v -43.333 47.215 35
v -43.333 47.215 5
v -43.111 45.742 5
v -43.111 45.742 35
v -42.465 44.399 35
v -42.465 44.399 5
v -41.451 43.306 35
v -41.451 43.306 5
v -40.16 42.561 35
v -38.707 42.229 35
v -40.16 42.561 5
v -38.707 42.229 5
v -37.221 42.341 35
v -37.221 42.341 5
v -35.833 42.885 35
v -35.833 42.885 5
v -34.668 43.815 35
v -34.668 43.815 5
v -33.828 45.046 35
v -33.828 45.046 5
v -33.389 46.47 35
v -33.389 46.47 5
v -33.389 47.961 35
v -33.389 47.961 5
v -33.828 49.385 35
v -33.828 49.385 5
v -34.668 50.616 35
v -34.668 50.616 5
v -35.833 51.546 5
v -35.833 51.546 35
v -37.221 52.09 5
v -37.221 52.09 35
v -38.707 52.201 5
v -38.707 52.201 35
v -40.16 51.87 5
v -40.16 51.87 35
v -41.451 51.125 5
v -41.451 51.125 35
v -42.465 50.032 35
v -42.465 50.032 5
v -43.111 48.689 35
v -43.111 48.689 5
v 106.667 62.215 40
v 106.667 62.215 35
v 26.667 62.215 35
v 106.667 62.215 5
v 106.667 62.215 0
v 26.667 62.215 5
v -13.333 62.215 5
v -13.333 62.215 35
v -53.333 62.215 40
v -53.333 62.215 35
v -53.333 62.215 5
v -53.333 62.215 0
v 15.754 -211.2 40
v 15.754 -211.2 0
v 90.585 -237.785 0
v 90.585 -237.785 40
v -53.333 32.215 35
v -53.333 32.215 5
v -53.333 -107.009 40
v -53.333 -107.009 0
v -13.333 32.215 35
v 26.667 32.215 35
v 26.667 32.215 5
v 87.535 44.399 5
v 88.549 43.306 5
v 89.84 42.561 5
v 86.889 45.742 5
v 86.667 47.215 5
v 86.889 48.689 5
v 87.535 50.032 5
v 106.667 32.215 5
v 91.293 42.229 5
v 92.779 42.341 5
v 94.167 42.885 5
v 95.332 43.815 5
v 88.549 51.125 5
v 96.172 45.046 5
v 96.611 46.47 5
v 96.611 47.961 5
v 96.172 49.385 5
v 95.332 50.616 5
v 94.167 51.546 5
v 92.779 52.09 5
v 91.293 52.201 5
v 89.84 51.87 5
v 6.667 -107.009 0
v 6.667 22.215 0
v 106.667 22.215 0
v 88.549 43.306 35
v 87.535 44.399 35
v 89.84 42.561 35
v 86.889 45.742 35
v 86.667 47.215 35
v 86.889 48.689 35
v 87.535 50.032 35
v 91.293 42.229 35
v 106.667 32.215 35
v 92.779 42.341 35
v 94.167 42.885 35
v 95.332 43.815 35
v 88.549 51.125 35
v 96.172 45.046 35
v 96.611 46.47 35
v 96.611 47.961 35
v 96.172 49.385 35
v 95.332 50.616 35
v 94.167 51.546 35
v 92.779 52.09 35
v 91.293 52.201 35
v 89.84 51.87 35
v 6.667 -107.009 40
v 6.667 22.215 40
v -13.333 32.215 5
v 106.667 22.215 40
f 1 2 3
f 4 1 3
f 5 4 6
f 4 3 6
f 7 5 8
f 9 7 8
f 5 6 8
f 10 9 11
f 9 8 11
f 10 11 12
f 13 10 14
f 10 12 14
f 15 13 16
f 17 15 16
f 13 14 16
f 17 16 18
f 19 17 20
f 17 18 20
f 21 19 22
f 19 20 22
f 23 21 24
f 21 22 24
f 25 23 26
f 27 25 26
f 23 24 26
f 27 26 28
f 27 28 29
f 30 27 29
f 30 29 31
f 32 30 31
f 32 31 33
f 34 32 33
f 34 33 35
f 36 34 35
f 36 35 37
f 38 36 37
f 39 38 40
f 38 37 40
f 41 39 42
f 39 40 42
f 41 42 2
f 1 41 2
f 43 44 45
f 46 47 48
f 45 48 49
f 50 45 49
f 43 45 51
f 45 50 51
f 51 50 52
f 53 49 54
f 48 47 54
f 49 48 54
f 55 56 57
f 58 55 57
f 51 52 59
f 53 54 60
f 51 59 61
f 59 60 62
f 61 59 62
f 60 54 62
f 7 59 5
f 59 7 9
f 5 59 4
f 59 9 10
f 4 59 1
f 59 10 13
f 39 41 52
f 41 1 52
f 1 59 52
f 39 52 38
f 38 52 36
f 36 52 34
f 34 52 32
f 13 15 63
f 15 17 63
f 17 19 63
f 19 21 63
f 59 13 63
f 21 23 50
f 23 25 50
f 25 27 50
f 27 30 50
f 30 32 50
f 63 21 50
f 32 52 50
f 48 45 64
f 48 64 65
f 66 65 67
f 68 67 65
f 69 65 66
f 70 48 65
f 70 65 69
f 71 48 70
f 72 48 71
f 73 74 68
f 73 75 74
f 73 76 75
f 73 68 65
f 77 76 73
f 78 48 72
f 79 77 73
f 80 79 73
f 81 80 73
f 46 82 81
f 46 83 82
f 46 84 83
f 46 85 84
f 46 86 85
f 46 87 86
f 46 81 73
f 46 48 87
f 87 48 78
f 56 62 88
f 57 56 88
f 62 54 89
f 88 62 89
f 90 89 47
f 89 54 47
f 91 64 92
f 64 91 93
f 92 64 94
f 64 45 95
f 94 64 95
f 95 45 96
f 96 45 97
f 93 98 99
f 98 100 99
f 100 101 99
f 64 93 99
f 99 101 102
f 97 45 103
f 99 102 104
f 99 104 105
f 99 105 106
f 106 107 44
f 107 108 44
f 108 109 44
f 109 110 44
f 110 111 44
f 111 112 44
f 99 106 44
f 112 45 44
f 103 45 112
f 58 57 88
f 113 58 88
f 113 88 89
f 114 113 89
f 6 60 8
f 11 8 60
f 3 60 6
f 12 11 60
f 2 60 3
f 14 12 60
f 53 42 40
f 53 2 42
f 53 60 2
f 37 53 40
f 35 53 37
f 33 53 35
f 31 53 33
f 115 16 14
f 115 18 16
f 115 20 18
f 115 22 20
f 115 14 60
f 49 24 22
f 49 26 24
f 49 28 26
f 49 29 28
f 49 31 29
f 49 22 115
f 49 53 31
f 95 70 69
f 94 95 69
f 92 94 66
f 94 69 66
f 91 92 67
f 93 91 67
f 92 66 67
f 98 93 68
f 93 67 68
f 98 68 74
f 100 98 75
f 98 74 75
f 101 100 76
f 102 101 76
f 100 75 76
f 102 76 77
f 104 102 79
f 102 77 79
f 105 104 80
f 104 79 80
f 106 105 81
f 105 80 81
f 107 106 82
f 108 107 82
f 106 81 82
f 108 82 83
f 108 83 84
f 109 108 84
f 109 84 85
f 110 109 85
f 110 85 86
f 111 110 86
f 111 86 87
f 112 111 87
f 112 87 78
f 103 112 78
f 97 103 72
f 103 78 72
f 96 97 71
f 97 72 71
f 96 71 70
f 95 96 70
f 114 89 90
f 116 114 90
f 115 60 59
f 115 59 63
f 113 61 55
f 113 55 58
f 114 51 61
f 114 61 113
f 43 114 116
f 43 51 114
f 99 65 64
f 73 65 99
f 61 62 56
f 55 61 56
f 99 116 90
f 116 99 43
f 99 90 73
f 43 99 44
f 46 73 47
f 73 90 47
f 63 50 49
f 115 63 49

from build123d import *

# Parameters (mm, degrees)
BOSS_EXTRUDE2_DEPTH = 40
SKETCH2_W           = 40
SKETCH2_H           = 30
CUT_EXTRUDE1_DEPTH  = 30
SKETCH3_R           = 5
BOSS_EXTRUDE3_DEPTH = 30
SKETCH4_W           = 80
SKETCH4_H           = 30
CUT_EXTRUDE2_DEPTH  = 30
SKETCH5_R           = 5
BOSS_EXTRUDE4_DEPTH = 30


with BuildPart() as part:
    # Sketch1 → Boss-Extrude2 (new body)
    with BuildSketch(Plane.XY):
        Polygon((106.666666667, 22.215384615), (106.666666667, 62.215384615), (-53.333333333, 62.215384615), (-53.333333333, -107.008547009), (15.753846154, -211.2), (90.584615385, -237.784615385), (6.666666667, -107.008547009), (6.666666667, 22.215384615), align=None)
    extrude(amount=BOSS_EXTRUDE2_DEPTH)

    # Sketch2 → Cut-Extrude1 (cut)
    with BuildSketch(Plane(origin=(0, 62.215384615, 0), x_dir=(1, 0, 0), z_dir=(0, 1, 0))):
        with Locations((-33.333333333, -20)):
            Rectangle(SKETCH2_W, SKETCH2_H)
    extrude(amount=-CUT_EXTRUDE1_DEPTH, mode=Mode.SUBTRACT)

    # Sketch3 → Boss-Extrude3 (add)
    with BuildSketch(Plane.XY.offset(5)):
        with Locations(Location((-38.333333333, 47.215384615, 0), (0, 0, 180))):
            Circle(SKETCH3_R)
    extrude(amount=BOSS_EXTRUDE3_DEPTH)

    # Sketch4 → Cut-Extrude2 (cut)
    with BuildSketch(Plane(origin=(0, 62.215384615, 0), x_dir=(1, 0, 0), z_dir=(0, 1, 0))):
        with Locations((66.666666667, -20)):
            Rectangle(SKETCH4_W, SKETCH4_H)
    extrude(amount=-CUT_EXTRUDE2_DEPTH, mode=Mode.SUBTRACT)

    # Sketch5 → Boss-Extrude4 (add)
    with BuildSketch(Plane.XY.offset(5)):
        with Locations(Location((91.666666667, 47.215384615, 0), (0, 0, 180))):
            Circle(SKETCH5_R)
    extrude(amount=BOSS_EXTRUDE4_DEPTH)


solid = part.part
